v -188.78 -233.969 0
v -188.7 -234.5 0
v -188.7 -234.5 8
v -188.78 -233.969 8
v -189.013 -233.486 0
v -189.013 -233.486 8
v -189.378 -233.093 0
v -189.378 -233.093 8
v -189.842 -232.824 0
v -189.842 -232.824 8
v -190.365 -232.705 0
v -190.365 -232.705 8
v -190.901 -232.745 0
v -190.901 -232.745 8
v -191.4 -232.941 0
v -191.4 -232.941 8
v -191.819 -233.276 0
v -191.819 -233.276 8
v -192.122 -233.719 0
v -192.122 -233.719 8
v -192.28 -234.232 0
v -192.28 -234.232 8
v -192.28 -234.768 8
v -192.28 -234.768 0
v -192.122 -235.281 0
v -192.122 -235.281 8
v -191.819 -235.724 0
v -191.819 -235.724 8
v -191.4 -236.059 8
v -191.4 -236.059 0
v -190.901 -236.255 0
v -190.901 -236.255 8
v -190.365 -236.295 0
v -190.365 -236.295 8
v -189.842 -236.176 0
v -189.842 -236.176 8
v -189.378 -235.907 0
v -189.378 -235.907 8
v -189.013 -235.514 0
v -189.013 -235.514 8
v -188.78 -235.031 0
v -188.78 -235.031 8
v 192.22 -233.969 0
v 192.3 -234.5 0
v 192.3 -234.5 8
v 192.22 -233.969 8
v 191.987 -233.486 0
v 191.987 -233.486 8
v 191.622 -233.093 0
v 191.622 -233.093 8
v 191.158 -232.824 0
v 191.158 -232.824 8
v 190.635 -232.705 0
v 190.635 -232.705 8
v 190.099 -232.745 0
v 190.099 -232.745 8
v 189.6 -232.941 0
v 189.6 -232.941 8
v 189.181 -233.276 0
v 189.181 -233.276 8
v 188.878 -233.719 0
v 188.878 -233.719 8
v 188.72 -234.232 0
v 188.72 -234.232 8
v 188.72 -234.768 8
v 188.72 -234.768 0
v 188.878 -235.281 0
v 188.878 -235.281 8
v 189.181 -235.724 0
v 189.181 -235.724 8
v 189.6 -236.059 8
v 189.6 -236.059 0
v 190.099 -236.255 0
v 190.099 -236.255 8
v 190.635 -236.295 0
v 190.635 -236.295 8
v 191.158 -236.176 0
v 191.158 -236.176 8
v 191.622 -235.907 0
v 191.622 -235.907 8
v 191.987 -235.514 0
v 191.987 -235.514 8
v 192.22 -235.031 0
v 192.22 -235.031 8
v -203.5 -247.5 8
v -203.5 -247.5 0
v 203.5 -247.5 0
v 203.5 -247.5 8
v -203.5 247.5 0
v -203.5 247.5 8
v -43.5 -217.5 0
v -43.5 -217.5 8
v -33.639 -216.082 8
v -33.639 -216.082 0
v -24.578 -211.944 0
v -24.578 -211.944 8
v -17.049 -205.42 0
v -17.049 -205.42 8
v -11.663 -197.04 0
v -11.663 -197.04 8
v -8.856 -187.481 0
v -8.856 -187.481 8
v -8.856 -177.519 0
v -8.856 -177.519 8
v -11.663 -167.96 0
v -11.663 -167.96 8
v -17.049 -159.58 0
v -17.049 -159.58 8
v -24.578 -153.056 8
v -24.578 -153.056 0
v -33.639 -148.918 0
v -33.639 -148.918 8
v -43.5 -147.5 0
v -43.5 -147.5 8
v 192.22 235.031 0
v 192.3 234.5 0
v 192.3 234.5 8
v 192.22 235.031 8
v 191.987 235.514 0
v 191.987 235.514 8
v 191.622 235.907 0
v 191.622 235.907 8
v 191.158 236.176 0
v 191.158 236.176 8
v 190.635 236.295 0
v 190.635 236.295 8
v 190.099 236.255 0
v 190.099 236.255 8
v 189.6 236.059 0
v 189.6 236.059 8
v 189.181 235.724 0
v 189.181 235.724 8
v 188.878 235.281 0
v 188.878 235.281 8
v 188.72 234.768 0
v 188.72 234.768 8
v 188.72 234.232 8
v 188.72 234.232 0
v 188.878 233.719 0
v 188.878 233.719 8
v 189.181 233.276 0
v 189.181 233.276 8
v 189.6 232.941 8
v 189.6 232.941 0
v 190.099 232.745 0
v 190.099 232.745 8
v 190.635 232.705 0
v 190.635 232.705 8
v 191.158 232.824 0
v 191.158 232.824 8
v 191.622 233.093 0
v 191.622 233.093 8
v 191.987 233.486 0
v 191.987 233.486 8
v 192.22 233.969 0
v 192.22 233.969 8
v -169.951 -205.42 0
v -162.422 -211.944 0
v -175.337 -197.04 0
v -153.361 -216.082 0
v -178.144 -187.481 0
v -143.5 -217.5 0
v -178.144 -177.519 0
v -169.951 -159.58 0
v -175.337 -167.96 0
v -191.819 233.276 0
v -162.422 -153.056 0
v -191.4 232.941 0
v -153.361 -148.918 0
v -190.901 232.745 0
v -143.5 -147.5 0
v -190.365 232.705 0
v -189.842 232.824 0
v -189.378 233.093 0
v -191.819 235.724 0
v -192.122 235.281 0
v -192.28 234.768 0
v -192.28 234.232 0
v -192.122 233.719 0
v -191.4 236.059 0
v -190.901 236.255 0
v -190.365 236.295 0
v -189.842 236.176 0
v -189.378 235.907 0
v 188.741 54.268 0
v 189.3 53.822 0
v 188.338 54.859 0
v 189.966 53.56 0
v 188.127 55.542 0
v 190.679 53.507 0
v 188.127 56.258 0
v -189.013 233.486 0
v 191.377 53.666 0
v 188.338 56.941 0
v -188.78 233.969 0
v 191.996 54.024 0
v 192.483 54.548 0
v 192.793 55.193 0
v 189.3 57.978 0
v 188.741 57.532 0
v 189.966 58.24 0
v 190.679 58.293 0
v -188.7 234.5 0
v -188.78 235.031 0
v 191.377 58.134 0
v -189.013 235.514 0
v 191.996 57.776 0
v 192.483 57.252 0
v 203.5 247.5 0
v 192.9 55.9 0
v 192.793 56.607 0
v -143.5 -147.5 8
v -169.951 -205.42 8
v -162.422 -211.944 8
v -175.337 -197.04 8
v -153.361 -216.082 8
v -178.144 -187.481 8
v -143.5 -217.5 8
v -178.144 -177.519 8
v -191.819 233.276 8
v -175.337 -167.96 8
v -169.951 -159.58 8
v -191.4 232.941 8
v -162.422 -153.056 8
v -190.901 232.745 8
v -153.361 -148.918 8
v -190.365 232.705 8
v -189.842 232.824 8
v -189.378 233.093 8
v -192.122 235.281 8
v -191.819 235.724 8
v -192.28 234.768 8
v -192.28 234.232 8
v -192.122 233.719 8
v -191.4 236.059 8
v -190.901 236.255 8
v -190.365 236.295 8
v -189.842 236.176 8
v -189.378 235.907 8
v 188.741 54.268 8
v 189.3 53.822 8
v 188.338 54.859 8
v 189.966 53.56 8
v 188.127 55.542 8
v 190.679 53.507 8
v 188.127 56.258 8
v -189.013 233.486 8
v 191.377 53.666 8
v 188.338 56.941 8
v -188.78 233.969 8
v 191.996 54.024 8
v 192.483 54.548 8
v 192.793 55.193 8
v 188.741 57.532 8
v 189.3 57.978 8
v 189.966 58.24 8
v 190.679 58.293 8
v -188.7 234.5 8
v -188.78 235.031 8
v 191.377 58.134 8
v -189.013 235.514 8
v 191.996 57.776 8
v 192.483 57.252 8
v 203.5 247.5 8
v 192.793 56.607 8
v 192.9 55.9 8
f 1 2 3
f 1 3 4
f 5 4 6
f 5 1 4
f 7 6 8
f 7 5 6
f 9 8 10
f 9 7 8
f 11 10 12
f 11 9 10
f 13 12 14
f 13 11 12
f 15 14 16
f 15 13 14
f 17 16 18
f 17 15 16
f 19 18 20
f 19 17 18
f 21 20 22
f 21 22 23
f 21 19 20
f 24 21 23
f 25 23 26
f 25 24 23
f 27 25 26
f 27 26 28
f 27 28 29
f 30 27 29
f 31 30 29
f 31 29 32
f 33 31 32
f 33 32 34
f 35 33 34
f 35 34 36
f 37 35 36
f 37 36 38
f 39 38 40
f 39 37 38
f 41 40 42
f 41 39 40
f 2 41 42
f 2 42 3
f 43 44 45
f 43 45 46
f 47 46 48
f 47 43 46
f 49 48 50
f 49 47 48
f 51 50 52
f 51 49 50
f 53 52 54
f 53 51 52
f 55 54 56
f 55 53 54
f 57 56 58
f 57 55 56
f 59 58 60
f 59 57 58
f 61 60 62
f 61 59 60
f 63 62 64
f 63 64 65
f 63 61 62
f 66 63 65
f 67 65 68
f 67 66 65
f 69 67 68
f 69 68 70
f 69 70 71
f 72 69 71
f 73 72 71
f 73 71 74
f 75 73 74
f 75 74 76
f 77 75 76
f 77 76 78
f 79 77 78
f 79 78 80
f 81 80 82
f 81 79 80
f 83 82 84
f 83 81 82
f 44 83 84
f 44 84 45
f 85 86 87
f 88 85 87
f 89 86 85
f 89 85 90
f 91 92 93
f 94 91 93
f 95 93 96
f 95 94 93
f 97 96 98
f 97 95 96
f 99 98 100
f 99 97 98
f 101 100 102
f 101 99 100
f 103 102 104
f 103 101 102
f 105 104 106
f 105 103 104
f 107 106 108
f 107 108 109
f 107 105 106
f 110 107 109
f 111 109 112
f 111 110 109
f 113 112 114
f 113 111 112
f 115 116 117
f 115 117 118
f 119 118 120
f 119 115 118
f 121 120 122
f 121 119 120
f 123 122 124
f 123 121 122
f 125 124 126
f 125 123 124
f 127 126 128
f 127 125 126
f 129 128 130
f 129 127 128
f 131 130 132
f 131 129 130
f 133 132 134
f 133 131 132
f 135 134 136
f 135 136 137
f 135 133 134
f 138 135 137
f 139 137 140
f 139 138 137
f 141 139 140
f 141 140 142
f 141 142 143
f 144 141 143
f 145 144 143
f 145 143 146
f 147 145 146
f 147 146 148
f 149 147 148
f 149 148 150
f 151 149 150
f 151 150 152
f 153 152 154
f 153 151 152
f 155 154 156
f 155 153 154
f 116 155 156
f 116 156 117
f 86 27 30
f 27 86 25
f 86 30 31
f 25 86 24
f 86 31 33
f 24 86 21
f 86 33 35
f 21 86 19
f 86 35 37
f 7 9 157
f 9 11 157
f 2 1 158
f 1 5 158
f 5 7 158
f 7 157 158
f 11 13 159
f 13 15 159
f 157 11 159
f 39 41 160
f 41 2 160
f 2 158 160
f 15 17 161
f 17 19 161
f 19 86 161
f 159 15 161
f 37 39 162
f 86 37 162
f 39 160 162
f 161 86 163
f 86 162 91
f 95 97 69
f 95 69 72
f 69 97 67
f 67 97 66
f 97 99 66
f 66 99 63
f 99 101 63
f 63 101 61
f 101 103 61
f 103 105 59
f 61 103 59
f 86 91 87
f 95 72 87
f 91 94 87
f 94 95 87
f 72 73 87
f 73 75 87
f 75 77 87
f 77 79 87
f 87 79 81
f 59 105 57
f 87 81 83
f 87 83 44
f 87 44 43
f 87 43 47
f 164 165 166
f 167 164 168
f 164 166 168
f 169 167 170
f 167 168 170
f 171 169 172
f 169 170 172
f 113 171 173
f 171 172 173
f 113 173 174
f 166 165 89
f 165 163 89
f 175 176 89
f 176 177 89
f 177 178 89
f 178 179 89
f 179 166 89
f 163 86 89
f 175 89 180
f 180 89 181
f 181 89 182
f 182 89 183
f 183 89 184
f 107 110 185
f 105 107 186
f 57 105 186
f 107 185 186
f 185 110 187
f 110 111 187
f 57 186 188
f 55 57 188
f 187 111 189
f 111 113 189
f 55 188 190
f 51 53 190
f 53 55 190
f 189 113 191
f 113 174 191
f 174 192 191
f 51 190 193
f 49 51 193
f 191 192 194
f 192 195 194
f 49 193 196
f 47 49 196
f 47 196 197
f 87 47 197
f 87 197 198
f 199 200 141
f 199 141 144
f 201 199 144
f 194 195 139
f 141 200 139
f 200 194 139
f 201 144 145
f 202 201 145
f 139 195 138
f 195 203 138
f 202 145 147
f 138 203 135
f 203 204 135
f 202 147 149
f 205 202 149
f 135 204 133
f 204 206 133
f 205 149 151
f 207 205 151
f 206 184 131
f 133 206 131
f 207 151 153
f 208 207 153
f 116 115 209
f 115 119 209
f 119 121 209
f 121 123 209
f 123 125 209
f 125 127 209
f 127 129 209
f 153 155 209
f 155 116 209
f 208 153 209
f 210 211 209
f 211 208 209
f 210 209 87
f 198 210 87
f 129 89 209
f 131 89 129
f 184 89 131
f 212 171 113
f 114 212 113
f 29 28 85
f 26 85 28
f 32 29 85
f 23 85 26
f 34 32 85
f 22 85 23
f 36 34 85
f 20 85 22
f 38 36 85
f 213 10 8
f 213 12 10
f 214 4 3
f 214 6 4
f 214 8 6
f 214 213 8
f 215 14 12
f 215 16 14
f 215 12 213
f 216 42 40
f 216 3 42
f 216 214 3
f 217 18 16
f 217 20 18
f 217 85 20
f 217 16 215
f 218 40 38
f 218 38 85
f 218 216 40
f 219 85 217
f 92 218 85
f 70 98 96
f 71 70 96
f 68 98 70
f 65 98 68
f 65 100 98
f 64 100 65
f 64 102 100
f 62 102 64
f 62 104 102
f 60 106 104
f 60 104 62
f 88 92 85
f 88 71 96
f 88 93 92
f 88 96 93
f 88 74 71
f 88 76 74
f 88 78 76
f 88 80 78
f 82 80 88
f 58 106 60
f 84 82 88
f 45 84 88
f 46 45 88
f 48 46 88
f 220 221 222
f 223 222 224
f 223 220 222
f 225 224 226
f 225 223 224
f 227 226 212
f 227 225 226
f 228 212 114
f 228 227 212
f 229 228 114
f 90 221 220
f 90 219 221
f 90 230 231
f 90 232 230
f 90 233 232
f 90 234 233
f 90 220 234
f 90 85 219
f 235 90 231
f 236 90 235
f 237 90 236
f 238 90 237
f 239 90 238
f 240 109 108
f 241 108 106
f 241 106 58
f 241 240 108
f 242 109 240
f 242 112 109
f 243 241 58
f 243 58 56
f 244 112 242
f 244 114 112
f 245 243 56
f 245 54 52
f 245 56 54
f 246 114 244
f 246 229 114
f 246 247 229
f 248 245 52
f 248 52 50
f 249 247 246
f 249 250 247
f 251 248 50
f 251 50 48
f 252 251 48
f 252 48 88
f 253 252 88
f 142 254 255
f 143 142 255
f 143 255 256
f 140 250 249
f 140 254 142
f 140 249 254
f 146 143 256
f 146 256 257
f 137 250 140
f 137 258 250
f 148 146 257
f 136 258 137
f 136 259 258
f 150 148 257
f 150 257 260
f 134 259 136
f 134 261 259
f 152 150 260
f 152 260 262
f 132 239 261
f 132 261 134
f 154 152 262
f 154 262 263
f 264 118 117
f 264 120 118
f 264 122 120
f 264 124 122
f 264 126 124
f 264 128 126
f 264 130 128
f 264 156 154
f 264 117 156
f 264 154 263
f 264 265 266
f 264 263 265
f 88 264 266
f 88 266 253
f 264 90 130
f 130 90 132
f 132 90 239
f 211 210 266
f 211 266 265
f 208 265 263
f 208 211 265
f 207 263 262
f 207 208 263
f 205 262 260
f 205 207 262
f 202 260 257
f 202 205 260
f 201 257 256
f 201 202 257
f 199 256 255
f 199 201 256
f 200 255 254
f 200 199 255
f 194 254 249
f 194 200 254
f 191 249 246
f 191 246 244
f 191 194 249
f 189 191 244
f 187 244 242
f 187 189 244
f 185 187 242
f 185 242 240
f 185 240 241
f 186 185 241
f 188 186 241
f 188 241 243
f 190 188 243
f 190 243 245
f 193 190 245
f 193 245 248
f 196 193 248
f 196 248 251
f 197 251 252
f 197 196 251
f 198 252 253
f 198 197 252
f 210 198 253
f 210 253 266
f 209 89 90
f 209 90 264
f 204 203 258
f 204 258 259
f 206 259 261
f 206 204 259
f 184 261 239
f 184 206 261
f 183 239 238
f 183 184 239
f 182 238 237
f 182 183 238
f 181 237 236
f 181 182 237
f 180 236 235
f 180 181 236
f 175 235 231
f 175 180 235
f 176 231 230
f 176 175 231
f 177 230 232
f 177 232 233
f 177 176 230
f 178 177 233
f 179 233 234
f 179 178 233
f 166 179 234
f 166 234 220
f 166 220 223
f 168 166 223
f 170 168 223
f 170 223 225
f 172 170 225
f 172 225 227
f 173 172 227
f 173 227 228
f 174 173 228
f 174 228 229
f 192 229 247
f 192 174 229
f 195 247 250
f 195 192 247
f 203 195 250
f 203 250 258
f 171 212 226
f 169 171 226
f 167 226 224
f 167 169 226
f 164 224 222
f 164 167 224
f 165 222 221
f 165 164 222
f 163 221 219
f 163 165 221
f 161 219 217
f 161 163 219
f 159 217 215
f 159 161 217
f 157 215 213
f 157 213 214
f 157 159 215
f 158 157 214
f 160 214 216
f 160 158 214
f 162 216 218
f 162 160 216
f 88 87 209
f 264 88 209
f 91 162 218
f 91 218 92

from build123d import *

# Parameters (mm, degrees)
SKETCH_W   = 407
SKETCH_H   = 495
SKETCH_R   = 1.8
SKETCH_R_2 = 2.4
PAD_DEPTH  = 8


with BuildPart() as part:
    # Sketch → Pad (new body)
    with BuildSketch(Plane.XY):
        Rectangle(SKETCH_W, SKETCH_H)
        with Locations((-190.5, 234.5)):
            Circle(SKETCH_R, mode=Mode.SUBTRACT)
        with Locations((190.5, 234.5)):
            Circle(SKETCH_R, mode=Mode.SUBTRACT)
        with Locations((-190.5, -234.5)):
            Circle(SKETCH_R, mode=Mode.SUBTRACT)
        with Locations((190.5, -234.5)):
            Circle(SKETCH_R, mode=Mode.SUBTRACT)
        with Locations((190.5, 55.9)):
            Circle(SKETCH_R_2, mode=Mode.SUBTRACT)
        with BuildLine():
            ThreePointArc((-143.5, -147.5), (-178.5, -182.5), (-143.5, -217.5))
            Line((-143.5, -217.5), (-43.5, -217.5))
            ThreePointArc((-43.5, -217.5), (-8.5, -182.5), (-43.5, -147.5))
            Line((-143.5, -147.5), (-43.5, -147.5))
        make_face(mode=Mode.SUBTRACT)
    extrude(amount=PAD_DEPTH)


solid = part.part
